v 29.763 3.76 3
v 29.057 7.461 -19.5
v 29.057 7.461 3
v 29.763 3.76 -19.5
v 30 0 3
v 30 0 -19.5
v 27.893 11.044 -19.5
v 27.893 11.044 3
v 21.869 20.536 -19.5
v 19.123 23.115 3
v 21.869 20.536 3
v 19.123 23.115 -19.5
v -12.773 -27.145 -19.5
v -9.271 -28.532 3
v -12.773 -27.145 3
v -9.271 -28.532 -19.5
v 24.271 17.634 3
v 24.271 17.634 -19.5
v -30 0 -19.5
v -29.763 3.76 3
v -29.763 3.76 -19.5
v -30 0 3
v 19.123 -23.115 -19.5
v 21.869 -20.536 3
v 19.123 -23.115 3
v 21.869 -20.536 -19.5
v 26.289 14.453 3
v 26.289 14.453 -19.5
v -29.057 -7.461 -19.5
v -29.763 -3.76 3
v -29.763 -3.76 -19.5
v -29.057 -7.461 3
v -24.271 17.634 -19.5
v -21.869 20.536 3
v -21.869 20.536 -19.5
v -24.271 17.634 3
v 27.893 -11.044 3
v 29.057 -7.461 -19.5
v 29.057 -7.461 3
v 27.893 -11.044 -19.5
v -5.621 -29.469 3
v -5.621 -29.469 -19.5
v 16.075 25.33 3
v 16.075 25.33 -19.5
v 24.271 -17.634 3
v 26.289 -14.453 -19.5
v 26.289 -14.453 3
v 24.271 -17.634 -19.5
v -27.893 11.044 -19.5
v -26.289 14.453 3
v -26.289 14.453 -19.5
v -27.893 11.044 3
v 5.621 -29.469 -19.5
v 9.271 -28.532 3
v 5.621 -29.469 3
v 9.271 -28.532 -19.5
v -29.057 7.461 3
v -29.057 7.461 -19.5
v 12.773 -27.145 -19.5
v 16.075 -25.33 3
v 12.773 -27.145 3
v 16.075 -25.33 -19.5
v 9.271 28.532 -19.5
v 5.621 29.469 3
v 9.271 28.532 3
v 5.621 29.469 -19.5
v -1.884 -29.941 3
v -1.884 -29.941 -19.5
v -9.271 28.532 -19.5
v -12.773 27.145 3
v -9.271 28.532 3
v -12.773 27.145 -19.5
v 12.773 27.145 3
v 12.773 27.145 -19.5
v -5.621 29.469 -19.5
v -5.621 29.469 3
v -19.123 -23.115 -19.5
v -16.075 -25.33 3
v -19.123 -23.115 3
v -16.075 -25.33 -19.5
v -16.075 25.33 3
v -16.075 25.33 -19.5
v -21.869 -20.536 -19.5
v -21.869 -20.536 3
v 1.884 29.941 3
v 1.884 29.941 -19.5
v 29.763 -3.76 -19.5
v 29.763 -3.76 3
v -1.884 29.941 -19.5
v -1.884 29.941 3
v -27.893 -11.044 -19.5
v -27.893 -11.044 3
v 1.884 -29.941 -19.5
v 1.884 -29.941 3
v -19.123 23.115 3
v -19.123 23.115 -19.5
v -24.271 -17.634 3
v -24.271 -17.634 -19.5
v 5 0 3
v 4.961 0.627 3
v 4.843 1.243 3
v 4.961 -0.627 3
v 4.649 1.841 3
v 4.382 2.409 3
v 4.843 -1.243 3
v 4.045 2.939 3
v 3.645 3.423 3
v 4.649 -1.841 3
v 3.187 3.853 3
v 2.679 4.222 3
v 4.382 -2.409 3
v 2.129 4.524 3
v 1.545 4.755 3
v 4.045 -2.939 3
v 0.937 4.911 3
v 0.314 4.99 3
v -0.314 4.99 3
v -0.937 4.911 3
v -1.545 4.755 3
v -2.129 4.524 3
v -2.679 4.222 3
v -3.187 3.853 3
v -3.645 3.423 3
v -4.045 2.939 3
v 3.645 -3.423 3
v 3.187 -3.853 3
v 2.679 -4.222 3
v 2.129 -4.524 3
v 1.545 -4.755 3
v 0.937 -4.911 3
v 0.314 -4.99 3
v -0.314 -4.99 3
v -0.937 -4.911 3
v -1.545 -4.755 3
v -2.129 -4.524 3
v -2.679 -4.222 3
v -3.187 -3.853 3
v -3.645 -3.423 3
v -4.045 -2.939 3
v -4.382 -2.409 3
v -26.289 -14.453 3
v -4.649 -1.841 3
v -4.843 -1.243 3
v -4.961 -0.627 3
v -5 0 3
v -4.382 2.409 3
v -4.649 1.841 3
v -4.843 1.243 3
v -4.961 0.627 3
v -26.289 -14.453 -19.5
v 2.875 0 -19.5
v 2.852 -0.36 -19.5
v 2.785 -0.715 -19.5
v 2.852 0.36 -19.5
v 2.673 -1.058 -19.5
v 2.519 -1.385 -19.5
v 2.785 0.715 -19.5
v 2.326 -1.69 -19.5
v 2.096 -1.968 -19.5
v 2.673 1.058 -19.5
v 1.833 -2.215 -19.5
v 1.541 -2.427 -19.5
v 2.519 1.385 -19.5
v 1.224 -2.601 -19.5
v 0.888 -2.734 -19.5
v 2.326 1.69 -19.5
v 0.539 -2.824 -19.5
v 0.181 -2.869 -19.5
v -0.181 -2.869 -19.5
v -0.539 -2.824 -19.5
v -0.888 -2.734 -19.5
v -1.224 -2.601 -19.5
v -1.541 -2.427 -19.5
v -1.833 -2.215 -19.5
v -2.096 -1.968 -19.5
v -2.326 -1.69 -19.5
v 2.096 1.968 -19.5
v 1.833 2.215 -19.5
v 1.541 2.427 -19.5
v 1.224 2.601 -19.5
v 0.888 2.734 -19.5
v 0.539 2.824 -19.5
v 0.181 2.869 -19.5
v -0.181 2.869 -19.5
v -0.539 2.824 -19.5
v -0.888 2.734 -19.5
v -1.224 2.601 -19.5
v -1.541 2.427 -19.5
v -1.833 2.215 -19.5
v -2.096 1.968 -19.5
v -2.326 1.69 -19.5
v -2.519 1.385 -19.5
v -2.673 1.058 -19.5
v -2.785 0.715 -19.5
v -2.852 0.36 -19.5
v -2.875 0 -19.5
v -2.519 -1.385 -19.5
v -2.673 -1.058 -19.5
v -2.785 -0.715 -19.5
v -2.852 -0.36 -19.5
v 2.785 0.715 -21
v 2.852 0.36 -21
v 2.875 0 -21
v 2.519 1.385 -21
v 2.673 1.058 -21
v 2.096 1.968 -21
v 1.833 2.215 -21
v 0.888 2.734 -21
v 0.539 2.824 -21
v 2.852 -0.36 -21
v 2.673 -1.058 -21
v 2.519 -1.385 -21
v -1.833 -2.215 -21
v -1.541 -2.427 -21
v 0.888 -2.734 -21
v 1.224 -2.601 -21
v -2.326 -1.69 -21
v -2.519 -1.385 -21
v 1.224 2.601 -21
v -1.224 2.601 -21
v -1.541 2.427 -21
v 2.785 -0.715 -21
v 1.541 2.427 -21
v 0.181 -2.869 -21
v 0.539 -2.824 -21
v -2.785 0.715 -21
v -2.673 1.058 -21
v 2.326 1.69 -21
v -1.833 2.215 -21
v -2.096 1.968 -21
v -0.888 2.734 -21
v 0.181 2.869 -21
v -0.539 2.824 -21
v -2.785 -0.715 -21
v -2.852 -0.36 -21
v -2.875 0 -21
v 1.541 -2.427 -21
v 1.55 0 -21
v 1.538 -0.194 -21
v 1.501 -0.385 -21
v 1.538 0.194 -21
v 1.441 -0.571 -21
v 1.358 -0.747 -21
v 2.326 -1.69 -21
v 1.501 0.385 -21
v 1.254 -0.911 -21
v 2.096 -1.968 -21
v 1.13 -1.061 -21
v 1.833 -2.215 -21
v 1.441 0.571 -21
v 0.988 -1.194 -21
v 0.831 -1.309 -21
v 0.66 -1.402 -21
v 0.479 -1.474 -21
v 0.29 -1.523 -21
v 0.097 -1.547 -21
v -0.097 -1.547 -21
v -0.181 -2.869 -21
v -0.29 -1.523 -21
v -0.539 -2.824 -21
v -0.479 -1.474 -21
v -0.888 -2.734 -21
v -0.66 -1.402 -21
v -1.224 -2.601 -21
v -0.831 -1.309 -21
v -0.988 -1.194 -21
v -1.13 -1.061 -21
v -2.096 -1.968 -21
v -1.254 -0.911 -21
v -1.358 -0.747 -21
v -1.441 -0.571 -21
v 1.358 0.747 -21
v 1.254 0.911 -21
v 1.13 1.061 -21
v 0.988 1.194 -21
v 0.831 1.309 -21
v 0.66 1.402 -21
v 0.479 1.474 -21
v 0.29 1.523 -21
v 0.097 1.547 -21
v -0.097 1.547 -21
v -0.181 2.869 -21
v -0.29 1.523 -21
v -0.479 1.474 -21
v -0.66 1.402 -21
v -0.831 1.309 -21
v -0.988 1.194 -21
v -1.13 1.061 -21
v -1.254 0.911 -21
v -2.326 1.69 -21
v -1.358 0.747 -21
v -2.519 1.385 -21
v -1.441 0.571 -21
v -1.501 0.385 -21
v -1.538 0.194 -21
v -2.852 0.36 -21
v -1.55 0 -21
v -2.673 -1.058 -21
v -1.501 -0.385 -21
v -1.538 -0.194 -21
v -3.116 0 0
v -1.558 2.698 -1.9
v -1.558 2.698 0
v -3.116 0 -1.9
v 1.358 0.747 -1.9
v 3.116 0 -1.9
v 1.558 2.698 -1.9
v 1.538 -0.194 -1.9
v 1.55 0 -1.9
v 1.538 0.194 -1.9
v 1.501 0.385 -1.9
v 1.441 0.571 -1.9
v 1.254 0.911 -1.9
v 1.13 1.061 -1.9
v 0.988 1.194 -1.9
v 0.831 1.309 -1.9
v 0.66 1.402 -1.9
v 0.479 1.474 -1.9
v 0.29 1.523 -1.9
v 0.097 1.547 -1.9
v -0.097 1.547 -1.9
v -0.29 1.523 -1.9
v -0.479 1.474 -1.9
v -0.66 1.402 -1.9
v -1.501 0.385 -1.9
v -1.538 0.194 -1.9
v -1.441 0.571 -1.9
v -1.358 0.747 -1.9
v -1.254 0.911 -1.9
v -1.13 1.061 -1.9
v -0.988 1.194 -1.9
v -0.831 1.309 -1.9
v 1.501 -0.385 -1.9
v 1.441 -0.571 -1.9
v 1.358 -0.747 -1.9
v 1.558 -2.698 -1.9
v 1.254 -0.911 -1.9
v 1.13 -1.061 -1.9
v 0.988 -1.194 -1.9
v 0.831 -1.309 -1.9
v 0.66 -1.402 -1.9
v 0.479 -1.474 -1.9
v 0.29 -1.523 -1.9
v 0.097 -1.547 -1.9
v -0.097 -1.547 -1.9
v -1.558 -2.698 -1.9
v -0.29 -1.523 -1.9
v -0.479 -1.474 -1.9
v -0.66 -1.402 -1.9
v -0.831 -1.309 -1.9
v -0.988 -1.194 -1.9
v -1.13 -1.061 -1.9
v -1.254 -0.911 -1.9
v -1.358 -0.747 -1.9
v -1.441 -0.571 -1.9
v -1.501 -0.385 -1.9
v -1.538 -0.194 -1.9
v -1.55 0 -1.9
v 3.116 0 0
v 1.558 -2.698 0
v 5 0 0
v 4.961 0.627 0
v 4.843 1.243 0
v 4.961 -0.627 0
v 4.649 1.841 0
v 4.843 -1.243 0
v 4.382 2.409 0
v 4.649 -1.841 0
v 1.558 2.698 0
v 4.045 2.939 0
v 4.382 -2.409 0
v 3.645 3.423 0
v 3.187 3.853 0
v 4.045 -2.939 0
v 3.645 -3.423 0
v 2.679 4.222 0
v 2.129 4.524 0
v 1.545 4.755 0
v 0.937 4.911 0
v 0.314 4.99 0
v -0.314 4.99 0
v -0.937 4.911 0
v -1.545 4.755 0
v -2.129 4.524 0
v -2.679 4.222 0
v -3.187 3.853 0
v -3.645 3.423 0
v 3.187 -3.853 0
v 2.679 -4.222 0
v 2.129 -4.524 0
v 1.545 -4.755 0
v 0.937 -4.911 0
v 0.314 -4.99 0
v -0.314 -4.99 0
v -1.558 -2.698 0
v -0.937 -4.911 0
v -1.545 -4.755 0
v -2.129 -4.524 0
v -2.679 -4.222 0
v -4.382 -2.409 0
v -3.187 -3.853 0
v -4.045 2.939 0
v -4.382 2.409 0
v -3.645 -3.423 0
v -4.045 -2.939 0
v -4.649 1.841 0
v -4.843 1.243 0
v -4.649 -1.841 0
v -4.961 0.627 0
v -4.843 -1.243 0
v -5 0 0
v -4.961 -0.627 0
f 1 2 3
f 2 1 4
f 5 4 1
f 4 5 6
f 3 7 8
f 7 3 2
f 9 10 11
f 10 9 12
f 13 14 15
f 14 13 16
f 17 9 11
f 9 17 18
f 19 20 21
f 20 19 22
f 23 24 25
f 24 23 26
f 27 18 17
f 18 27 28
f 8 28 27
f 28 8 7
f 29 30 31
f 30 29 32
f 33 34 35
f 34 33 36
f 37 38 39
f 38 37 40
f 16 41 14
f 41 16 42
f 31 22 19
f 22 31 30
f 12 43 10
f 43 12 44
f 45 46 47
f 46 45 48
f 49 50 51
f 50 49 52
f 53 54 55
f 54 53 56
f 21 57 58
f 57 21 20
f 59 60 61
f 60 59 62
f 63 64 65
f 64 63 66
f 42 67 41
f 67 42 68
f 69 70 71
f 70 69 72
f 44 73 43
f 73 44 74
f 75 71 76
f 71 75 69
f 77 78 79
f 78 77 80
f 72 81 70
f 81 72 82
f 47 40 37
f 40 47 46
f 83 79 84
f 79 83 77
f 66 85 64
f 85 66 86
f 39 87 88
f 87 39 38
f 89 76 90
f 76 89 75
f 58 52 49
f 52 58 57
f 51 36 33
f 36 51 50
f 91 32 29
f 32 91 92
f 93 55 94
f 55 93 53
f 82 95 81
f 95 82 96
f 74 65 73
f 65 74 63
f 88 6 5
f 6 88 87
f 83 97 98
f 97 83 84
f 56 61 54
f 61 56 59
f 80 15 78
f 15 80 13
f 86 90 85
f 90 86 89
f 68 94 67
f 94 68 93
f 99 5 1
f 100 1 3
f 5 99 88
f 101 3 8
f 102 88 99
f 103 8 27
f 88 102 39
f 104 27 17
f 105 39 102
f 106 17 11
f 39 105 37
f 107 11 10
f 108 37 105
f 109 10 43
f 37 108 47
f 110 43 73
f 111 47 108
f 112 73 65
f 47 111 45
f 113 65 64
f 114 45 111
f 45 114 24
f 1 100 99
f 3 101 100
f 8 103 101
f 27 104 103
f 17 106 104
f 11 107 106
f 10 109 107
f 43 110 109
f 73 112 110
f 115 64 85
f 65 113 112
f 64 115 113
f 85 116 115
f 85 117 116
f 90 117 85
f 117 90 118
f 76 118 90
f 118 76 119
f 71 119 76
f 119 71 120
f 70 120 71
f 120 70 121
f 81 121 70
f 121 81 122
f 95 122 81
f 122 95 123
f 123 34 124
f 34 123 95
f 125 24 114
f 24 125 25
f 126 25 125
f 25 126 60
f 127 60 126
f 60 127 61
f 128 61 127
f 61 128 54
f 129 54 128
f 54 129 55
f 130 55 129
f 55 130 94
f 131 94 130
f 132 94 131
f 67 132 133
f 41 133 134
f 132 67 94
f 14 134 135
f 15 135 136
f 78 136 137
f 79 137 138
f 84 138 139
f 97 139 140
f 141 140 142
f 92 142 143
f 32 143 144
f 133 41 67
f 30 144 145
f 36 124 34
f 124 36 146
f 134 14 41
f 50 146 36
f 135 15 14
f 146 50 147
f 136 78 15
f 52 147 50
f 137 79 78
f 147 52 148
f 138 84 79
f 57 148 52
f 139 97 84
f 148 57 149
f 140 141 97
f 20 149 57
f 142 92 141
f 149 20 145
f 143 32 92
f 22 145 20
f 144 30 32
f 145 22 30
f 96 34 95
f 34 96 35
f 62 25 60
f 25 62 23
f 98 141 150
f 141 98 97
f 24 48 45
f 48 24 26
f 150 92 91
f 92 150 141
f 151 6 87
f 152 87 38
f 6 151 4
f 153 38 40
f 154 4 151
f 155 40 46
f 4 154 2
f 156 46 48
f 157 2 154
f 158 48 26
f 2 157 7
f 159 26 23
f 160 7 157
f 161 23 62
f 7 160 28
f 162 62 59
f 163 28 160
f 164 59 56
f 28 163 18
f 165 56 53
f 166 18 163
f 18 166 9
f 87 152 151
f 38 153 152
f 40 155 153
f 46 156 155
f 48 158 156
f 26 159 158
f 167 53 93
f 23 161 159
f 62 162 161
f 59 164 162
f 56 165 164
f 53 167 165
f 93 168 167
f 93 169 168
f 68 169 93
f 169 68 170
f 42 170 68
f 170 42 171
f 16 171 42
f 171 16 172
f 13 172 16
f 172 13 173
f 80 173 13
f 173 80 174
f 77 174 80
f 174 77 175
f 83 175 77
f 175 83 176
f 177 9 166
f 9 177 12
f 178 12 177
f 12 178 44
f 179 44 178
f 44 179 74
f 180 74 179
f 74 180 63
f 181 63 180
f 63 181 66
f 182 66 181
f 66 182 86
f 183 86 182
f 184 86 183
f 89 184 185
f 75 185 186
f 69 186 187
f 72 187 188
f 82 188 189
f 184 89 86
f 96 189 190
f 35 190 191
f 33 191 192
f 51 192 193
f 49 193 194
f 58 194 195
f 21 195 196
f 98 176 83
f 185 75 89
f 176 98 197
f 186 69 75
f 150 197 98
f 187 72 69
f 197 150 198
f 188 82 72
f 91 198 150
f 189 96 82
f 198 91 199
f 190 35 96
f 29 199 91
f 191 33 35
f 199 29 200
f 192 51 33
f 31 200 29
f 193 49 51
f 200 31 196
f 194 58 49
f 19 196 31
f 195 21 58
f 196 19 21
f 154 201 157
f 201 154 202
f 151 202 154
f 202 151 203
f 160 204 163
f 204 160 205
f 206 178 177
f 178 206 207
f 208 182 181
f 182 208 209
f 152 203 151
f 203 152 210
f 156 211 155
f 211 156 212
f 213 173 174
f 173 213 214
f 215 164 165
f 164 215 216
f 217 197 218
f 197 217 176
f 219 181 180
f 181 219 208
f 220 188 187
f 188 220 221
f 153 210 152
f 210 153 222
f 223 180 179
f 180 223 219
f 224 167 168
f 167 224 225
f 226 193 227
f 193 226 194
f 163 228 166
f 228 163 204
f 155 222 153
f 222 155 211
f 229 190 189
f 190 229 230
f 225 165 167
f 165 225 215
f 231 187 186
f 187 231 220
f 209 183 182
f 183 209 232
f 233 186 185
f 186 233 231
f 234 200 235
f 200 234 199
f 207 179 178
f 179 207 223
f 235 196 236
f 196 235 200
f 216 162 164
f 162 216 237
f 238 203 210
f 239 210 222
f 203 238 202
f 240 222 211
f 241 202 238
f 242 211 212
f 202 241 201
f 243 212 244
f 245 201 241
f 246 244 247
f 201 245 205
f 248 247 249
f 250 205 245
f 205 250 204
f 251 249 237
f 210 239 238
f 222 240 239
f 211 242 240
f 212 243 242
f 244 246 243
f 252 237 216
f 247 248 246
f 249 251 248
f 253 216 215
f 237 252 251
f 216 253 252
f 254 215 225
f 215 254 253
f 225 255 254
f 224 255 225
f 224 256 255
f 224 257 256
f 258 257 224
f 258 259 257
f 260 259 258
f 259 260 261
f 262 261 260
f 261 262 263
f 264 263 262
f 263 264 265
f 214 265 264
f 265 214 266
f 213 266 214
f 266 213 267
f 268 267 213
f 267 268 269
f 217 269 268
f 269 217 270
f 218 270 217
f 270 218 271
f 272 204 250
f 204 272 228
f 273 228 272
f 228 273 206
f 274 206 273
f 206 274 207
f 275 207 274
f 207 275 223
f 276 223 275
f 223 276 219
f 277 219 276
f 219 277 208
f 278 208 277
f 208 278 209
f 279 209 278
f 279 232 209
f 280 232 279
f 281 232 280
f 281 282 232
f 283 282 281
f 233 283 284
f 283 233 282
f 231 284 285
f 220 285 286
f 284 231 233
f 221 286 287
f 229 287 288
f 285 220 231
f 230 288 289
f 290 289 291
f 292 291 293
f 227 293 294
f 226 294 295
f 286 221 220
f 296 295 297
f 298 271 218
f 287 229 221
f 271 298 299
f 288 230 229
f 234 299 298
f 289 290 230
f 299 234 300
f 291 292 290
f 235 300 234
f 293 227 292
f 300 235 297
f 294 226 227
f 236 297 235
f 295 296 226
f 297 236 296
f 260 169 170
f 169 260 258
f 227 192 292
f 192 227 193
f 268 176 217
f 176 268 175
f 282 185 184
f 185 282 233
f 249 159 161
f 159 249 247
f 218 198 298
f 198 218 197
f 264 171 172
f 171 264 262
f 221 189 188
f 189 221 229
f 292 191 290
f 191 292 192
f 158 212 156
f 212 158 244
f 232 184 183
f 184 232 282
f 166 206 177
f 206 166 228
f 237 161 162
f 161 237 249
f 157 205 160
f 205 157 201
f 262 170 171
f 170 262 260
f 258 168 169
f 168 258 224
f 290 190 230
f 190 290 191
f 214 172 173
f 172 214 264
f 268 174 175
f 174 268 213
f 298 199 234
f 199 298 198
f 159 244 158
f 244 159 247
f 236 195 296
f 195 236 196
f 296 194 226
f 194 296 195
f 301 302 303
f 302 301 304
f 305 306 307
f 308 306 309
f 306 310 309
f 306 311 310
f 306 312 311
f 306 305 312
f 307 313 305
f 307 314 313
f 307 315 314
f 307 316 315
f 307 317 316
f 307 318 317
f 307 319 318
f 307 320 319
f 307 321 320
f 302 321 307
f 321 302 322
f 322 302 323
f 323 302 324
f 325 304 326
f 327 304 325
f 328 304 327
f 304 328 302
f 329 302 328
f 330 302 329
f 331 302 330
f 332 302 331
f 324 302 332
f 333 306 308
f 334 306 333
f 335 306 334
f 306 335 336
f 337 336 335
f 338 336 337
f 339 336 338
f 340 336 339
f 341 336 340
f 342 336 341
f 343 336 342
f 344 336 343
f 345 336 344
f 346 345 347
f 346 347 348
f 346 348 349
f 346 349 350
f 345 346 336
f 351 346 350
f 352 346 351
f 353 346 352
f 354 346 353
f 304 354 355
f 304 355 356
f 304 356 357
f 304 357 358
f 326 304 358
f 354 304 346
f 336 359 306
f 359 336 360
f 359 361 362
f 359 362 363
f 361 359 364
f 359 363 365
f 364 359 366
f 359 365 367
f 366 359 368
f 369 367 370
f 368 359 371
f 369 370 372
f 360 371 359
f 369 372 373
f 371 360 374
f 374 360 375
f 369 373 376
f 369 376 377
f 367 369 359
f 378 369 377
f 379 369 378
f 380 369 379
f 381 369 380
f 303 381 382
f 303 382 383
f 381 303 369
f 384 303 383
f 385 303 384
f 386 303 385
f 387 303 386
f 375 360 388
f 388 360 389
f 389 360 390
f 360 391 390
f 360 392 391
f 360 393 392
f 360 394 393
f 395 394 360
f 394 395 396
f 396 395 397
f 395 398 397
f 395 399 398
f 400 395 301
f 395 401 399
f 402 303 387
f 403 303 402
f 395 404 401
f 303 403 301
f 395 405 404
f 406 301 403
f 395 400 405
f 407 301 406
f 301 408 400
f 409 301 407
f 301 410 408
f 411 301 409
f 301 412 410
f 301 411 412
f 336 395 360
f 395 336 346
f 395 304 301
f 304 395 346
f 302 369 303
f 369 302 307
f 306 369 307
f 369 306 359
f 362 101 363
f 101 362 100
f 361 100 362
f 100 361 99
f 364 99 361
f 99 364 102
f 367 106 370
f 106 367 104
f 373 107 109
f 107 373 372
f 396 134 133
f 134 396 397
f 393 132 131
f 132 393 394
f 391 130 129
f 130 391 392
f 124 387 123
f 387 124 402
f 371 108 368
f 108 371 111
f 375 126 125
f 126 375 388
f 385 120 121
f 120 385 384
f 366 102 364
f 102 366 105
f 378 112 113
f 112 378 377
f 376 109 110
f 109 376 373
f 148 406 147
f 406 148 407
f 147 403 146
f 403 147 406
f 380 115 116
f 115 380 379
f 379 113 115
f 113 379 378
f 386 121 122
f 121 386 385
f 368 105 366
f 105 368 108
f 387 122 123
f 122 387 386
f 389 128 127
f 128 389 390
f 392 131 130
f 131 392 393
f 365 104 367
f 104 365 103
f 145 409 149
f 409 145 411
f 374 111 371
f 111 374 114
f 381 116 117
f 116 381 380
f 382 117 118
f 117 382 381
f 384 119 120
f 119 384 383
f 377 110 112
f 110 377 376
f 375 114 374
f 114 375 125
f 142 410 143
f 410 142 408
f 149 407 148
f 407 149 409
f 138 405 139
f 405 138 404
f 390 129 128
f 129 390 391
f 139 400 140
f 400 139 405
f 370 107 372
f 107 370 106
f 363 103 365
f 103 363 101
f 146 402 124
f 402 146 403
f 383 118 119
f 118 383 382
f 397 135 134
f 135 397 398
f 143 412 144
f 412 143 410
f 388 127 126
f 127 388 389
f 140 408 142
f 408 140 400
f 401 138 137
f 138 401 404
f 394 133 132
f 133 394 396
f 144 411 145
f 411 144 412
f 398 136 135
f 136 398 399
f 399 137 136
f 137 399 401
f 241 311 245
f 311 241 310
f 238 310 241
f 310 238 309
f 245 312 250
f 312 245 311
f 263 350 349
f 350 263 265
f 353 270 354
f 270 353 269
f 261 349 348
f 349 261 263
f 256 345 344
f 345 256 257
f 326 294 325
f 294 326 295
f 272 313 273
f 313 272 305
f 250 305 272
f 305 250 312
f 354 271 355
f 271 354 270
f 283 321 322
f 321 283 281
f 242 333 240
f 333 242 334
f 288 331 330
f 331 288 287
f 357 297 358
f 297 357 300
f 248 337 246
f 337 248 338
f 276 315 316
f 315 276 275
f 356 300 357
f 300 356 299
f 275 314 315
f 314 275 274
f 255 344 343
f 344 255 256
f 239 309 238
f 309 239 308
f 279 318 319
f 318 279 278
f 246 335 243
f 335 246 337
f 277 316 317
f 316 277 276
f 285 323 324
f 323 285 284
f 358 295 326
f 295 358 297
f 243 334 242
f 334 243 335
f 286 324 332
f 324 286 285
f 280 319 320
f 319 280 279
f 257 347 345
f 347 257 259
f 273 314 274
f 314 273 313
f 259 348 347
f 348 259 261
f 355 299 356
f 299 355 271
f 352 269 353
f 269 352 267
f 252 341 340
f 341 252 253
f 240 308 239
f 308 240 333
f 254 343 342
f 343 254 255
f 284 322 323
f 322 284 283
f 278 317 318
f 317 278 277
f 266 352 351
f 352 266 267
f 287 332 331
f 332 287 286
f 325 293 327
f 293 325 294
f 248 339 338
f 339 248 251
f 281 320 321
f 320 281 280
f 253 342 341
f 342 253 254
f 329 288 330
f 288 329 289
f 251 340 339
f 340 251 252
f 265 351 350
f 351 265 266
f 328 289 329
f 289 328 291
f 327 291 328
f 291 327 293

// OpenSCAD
$fn = 50;


difference() {
	union() {
		translate(v = [0, 0, -19.5000000000]) {
			cylinder(h = 22.5000000000, r = 30.0000000000);
		}
		#translate(v = [0, 0, -21.0000000000]) {
			cylinder(h = 21, r = 2.8750000000);
		}
	}
	union() {
		translate(v = [0, 0, 0]) {
			rotate(a = [0, 0, 0]) {
				difference() {
					union() {
						translate(v = [0, 0, -1.9000000000]) {
							linear_extrude(height = 1.9000000000) {
								polygon(points = [[3.1158000000, 0.0000000000], [1.5579000000, 2.6983619531], [-1.5579000000, 2.6983619531], [-3.1158000000, 0.0000000000], [-1.5579000000, -2.6983619531], [1.5579000000, -2.6983619531]]);
							}
						}
					}
					union();
				}
			}
		}
		#cylinder(h = 3, r = 5.0000000000);
		#translate(v = [0, 0, -100.0000000000]) {
			cylinder(h = 200, r = 1.5500000000);
		}
	}
}
